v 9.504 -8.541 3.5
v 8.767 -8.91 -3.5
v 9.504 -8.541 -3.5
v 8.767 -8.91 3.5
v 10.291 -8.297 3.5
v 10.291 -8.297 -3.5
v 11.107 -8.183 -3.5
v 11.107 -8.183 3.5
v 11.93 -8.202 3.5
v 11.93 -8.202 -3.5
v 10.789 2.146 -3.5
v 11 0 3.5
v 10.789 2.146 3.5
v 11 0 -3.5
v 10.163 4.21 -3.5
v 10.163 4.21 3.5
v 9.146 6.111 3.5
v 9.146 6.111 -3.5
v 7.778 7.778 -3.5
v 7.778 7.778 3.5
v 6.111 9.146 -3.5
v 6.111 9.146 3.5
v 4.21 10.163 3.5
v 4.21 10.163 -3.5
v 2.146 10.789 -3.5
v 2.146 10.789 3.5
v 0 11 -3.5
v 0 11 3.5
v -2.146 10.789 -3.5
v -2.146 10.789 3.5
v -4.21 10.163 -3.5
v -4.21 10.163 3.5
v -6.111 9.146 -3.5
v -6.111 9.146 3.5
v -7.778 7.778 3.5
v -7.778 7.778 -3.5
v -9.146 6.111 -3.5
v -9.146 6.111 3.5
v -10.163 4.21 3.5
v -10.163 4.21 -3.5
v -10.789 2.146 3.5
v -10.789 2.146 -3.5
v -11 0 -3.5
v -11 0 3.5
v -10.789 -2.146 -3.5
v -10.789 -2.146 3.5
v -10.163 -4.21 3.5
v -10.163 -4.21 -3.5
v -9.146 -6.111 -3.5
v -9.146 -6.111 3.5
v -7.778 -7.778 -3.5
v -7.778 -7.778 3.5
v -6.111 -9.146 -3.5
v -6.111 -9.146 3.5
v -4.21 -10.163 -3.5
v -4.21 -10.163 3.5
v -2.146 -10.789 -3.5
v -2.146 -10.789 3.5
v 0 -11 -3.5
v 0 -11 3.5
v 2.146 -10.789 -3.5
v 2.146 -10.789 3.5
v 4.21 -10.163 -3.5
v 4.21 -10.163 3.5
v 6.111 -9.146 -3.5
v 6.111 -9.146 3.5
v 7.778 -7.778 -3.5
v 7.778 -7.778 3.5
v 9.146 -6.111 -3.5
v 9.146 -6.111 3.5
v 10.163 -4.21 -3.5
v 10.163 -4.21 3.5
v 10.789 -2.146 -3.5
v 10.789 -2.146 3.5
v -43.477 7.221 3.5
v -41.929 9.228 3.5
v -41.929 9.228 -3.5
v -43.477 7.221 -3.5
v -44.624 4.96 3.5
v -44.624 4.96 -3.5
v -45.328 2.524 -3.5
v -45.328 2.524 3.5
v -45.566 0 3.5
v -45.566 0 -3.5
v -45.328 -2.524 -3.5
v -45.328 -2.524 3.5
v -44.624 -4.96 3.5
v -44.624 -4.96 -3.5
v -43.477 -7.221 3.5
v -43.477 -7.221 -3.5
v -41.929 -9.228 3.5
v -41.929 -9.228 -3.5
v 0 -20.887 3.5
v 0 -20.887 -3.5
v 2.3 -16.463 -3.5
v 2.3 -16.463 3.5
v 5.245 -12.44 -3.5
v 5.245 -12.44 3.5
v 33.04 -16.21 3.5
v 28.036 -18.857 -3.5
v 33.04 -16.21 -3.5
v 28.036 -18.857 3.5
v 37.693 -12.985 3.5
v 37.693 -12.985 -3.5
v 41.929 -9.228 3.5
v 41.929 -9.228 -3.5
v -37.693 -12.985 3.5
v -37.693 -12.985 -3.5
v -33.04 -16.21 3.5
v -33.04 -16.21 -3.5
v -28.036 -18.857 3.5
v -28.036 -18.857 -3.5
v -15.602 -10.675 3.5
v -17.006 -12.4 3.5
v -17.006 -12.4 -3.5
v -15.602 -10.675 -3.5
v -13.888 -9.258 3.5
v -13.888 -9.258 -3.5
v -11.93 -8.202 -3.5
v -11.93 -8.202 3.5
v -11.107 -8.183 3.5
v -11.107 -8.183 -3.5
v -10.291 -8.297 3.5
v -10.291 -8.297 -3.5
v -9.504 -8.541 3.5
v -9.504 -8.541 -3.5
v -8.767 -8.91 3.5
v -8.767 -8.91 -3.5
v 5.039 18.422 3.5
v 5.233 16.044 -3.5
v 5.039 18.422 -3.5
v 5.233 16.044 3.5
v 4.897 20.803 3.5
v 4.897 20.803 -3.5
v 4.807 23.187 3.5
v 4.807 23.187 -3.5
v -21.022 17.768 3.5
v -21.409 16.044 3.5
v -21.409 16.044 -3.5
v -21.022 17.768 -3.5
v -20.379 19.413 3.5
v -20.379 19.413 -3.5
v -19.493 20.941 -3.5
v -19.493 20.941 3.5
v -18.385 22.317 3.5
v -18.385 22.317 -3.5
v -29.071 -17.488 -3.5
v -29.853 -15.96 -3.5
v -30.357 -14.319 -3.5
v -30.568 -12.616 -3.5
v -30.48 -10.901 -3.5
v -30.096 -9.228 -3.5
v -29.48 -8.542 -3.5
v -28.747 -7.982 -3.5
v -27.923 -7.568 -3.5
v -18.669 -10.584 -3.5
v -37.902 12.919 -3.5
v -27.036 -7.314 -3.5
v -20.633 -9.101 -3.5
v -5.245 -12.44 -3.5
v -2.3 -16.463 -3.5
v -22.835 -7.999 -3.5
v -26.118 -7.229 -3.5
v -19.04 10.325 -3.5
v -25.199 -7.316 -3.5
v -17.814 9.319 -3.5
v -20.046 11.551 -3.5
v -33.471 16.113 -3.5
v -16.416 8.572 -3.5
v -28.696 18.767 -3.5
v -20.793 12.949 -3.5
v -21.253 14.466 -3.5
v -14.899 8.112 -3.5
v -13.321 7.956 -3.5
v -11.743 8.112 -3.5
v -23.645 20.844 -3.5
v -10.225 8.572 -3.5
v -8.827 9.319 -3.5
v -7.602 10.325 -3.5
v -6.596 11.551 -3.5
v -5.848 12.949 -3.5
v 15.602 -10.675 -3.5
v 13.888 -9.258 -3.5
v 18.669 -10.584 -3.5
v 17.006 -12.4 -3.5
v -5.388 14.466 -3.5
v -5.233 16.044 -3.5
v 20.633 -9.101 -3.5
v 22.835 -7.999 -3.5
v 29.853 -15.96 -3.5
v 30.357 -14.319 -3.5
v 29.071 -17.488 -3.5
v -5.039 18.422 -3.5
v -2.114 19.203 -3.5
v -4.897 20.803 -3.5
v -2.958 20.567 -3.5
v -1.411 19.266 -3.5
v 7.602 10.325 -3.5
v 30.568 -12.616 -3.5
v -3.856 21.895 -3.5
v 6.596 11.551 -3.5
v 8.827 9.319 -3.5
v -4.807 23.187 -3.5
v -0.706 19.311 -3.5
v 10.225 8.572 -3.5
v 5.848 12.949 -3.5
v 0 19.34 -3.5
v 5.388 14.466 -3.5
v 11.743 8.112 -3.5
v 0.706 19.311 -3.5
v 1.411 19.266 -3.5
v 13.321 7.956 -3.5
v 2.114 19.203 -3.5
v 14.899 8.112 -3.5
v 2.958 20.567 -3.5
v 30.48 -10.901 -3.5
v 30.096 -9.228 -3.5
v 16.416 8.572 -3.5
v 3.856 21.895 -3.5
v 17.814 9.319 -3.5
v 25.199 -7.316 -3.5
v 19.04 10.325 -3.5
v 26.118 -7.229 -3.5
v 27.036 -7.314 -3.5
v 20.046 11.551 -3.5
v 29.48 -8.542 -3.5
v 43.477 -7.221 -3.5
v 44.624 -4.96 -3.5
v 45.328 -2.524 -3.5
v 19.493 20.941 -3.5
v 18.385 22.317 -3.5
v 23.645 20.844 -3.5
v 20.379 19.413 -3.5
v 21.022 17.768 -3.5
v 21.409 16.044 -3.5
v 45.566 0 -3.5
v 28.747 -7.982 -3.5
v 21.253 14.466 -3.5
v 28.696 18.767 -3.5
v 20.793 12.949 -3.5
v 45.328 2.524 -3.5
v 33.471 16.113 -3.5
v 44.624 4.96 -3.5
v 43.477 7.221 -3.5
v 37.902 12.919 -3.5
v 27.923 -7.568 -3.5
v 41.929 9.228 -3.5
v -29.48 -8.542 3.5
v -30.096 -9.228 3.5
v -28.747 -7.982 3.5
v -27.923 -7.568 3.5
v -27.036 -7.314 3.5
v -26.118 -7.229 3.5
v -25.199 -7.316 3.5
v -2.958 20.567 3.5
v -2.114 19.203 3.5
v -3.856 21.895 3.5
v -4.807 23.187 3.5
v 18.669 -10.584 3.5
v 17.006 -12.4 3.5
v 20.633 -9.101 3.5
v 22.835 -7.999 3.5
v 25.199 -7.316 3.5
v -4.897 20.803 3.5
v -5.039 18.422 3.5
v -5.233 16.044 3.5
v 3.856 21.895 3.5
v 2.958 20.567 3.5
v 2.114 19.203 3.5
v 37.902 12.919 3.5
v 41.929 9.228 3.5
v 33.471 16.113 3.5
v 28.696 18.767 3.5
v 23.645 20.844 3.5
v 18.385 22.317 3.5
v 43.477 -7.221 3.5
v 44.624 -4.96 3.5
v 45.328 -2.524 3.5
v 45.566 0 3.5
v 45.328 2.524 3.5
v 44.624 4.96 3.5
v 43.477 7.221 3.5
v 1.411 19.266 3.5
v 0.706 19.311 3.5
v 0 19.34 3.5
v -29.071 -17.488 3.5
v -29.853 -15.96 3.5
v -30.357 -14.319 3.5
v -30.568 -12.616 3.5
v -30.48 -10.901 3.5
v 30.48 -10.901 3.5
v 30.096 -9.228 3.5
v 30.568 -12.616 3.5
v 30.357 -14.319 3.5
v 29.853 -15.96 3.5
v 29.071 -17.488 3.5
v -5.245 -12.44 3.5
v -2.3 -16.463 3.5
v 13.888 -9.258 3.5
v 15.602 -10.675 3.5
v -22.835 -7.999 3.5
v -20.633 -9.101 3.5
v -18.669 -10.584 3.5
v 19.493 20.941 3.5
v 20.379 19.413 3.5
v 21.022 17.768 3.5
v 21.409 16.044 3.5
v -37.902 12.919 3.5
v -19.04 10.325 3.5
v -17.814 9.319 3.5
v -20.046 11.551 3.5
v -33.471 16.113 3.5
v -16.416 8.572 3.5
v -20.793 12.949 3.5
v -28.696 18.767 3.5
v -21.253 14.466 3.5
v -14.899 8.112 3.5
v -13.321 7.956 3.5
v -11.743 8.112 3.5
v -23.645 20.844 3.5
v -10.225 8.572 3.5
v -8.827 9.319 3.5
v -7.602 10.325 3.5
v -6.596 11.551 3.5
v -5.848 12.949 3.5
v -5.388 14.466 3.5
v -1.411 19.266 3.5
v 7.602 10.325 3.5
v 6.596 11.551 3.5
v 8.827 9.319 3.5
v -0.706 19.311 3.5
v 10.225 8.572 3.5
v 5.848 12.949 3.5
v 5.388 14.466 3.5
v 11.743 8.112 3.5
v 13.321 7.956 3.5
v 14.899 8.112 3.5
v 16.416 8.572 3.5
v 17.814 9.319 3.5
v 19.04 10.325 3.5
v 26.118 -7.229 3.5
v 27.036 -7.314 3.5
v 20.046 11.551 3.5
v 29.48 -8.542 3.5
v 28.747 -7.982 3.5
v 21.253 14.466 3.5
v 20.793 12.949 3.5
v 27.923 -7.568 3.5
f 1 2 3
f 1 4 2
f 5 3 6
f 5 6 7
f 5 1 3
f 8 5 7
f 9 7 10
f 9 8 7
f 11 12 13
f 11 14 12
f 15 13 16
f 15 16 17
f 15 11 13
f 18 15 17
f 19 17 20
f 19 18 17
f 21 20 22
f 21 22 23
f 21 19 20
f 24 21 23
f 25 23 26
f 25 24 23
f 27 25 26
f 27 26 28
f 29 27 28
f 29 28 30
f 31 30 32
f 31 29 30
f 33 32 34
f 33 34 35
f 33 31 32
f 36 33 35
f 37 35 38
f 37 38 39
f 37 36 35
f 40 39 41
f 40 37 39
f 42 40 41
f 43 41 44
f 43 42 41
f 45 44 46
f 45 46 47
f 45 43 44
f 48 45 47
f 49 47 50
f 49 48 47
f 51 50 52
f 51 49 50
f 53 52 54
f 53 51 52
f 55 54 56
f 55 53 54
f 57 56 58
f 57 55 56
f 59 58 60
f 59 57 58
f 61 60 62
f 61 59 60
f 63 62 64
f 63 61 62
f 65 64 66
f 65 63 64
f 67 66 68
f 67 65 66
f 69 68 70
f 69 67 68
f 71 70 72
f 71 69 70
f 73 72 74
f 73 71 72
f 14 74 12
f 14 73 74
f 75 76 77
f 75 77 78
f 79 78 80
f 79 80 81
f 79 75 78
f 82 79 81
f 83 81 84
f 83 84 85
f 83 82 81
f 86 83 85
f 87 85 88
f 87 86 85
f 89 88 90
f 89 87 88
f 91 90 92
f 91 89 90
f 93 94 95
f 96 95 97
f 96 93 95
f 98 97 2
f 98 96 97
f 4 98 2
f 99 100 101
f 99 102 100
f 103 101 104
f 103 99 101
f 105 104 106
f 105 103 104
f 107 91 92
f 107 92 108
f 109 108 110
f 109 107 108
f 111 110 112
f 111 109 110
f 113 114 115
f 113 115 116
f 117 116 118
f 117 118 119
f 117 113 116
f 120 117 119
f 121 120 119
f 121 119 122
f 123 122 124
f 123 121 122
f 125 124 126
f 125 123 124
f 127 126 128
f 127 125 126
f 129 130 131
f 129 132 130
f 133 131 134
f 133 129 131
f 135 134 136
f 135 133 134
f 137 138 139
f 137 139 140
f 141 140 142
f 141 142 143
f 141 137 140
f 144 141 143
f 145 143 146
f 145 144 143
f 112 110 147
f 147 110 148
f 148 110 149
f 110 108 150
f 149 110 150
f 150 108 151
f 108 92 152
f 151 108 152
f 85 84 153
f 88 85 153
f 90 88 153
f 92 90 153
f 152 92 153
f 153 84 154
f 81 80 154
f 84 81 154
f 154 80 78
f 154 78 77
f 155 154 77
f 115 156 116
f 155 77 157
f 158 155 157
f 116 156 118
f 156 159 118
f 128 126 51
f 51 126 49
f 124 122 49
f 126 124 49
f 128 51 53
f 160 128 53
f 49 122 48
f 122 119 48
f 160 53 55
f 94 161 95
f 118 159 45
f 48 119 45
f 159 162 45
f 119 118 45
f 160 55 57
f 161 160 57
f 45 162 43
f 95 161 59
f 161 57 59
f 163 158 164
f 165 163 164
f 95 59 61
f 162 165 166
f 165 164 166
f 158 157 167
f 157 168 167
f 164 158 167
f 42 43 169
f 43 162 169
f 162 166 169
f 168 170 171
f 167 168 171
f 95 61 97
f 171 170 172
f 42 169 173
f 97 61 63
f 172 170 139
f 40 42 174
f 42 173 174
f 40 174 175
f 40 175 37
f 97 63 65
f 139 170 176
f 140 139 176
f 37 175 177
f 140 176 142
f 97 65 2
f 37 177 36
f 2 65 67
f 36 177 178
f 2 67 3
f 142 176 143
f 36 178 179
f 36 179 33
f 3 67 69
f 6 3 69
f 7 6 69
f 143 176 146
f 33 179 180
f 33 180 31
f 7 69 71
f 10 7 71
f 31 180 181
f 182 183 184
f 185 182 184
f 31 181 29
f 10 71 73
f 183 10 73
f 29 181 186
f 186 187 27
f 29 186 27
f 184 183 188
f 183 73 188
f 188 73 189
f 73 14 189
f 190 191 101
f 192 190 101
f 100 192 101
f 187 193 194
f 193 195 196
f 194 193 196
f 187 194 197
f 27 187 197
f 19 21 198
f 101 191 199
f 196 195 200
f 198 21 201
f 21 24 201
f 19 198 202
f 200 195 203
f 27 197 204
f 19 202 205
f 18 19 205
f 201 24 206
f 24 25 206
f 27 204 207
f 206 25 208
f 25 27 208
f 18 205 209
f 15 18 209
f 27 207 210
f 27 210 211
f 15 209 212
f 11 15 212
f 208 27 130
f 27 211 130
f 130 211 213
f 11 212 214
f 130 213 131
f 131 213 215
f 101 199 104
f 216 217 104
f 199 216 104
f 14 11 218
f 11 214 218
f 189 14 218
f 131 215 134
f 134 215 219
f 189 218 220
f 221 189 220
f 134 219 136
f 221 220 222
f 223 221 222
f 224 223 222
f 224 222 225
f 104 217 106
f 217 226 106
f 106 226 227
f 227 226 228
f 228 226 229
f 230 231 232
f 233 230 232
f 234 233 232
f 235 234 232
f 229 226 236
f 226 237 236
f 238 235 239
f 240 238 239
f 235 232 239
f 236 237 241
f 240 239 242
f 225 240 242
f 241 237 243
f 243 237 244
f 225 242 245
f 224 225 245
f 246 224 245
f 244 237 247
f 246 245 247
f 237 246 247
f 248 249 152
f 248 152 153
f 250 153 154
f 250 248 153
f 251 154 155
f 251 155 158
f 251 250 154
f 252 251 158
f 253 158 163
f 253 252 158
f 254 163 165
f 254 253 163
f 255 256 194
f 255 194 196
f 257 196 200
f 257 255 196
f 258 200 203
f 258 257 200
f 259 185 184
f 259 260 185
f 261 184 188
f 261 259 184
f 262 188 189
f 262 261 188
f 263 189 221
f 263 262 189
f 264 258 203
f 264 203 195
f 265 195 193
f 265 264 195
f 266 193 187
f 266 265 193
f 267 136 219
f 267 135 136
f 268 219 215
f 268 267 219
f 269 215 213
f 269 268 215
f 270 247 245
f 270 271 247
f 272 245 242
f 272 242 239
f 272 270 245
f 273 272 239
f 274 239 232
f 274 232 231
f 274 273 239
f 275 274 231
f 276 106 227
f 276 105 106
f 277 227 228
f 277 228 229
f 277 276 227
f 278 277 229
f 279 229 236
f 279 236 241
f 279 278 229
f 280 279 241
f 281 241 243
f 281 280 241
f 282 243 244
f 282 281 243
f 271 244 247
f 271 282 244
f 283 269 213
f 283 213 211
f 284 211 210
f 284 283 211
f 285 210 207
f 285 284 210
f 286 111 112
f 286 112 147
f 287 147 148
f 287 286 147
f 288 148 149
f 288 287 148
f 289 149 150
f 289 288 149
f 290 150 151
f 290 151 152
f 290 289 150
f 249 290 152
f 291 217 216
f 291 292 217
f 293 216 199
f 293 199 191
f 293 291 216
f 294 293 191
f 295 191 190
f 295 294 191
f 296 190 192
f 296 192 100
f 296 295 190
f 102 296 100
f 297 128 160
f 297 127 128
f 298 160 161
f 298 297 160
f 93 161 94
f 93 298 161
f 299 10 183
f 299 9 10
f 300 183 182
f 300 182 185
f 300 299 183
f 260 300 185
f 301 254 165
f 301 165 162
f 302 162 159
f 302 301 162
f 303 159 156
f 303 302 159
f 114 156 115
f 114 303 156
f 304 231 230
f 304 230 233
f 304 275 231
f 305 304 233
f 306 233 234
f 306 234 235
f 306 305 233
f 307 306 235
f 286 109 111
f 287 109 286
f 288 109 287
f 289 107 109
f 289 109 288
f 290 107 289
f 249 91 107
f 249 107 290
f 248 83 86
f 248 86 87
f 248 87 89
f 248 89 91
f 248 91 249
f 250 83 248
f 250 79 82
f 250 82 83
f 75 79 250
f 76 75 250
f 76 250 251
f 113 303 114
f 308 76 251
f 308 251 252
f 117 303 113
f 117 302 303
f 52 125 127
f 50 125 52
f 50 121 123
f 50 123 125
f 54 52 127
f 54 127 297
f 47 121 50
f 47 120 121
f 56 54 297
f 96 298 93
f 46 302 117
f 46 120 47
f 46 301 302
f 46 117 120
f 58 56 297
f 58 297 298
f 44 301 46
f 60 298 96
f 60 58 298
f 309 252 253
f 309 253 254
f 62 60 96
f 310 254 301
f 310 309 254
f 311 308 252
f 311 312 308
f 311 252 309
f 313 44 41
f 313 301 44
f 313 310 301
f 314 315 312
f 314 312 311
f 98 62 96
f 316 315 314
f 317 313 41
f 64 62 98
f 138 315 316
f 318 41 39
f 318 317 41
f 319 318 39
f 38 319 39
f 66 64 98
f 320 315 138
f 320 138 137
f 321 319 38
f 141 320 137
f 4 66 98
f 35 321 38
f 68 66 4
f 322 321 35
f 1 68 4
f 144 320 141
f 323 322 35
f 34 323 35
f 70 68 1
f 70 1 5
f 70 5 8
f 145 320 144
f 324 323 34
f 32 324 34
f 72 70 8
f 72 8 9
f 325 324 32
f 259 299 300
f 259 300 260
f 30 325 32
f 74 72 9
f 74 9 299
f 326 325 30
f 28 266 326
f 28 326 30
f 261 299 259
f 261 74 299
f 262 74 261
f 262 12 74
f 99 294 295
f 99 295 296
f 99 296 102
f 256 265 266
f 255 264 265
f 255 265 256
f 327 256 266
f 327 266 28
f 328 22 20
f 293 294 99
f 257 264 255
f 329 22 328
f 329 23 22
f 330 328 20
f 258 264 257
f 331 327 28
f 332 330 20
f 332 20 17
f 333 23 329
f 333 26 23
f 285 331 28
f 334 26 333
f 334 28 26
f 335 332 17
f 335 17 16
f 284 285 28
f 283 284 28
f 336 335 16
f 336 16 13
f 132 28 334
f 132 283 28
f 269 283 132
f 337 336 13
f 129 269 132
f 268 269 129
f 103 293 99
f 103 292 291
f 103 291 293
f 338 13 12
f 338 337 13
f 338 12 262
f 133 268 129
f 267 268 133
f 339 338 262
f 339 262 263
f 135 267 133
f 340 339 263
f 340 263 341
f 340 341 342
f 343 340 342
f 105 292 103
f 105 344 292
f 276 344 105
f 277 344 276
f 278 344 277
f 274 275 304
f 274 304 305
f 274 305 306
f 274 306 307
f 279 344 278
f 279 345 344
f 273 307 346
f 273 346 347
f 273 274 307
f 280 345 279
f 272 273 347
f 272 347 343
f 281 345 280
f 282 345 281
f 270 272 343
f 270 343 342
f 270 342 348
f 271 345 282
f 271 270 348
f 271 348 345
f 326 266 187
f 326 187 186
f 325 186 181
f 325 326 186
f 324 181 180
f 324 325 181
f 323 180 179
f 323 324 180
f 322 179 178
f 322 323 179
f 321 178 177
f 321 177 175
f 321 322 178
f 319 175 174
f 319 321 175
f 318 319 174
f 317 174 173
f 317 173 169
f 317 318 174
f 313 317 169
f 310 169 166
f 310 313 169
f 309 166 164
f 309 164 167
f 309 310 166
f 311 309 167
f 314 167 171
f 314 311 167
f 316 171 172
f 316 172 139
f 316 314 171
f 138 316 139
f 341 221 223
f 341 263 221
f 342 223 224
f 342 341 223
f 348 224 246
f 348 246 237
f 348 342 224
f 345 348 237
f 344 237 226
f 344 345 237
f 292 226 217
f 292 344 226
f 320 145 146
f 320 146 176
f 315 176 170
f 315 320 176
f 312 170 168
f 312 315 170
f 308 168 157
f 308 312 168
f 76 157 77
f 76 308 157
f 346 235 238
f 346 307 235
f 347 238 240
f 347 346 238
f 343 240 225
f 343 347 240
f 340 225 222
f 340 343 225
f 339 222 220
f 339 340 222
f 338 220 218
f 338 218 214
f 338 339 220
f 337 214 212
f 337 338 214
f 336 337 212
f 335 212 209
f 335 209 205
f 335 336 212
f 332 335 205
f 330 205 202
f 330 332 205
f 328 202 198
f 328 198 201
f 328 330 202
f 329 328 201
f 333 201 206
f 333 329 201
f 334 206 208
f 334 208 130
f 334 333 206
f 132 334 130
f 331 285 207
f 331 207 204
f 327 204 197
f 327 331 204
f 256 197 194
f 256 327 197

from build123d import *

# Parameters (mm, degrees)
F0_R     = 11
F1_DEPTH = 3.5


with BuildPart() as f1:
    # F0 (on Top) → F1 (new body, symmetric)
    with BuildSketch(Plane.XY):
        with BuildLine():
            ThreePointArc((4.8068902284, 23.1867481814), (3.40065434, 21.2355802686), (2.1143376362, 19.2033536732))
            ThreePointArc((2.1143376362, 19.2033536732), (1.0584202785, 19.2909091426), (0, 19.3396322429))
            ThreePointArc((0, 19.3396322429), (-1.0584202785, 19.2909091426), (-2.1143376362, 19.2033536732))
            ThreePointArc((-2.1143376362, 19.2033536732), (-3.40065434, 21.2355802686), (-4.8068902284, 23.1867481814))
            ThreePointArc((-4.8068902284, 23.1867481814), (-4.9615717482, 19.612078626), (-5.2325893193, 16.0443428904))
            ThreePointArc((-5.2325893193, 16.0443428904), (-13.3206225283, 7.9563096814), (-21.4086557373, 16.0443428904))
            ThreePointArc((-21.4086557373, 16.0443428904), (-20.3787118799, 19.4130691175), (-18.3847115054, 22.3170428173))
            ThreePointArc((-18.3847115054, 22.3170428173), (-31.1223848305, 17.5096597623), (-41.9289059937, 9.2284549028))
            ThreePointArc((-41.9289059937, 9.2284549028), (-45.5657635204, 0), (-41.9289059937, -9.2284549028))
            ThreePointArc((-41.9289059937, -9.2284549028), (-35.4148236465, -14.666894454), (-28.0357005491, -18.857173191))
            ThreePointArc((-28.0357005491, -18.857173191), (-30.3567973633, -14.31904571), (-30.0960739695, -9.2284549028))
            ThreePointArc((-30.0960739695, -9.2284549028), (-27.9226796708, -7.5682851491), (-25.1994561404, -7.3155798018))
            ThreePointArc((-25.1994561404, -7.3155798018), (-20.6333159795, -9.1010108427), (-17.0062072575, -12.399720028))
            ThreePointArc((-17.0062072575, -12.399720028), (-14.7799976822, -9.9240492174), (-11.9304154068, -8.2021793351))
            ThreePointArc((-11.9304154068, -8.2021793351), (-10.290534836, -8.2969879927), (-8.7665580213, -8.9099248871))
            ThreePointArc((-8.7665580213, -8.9099248871), (-3.6958082863, -14.3954527894), (0, -20.8873338997))
            ThreePointArc((0, -20.8873338997), (3.6958082863, -14.3954527894), (8.7665580213, -8.9099248871))
            ThreePointArc((8.7665580213, -8.9099248871), (10.290534836, -8.2969879927), (11.9304154068, -8.2021793351))
            ThreePointArc((11.9304154068, -8.2021793351), (14.7799976822, -9.9240492174), (17.0062072575, -12.399720028))
            ThreePointArc((17.0062072575, -12.399720028), (20.6333159795, -9.1010108427), (25.1994561404, -7.3155798018))
            ThreePointArc((25.1994561404, -7.3155798018), (27.9226796708, -7.5682851491), (30.0960739695, -9.2284549028))
            ThreePointArc((30.0960739695, -9.2284549028), (30.3567973633, -14.31904571), (28.0357005491, -18.857173191))
            ThreePointArc((28.0357005491, -18.857173191), (35.4148236465, -14.666894454), (41.9289059937, -9.2284549028))
            ThreePointArc((41.9289059937, -9.2284549028), (45.5657635204, 0), (41.9289059937, 9.2284549028))
            ThreePointArc((41.9289059937, 9.2284549028), (31.1223848305, 17.5096597623), (18.3847115054, 22.3170428173))
            ThreePointArc((18.3847115054, 22.3170428173), (20.3787118799, 19.4130691175), (21.4086557373, 16.0443428904))
            ThreePointArc((21.4086557373, 16.0443428904), (13.3206225283, 7.9563096814), (5.2325893193, 16.0443428904))
            ThreePointArc((5.2325893193, 16.0443428904), (4.9615717482, 19.612078626), (4.8068902284, 23.1867481814))
        make_face()
        Circle(F0_R, mode=Mode.SUBTRACT)
    extrude(amount=F1_DEPTH, both=True)


solid = f1.part
